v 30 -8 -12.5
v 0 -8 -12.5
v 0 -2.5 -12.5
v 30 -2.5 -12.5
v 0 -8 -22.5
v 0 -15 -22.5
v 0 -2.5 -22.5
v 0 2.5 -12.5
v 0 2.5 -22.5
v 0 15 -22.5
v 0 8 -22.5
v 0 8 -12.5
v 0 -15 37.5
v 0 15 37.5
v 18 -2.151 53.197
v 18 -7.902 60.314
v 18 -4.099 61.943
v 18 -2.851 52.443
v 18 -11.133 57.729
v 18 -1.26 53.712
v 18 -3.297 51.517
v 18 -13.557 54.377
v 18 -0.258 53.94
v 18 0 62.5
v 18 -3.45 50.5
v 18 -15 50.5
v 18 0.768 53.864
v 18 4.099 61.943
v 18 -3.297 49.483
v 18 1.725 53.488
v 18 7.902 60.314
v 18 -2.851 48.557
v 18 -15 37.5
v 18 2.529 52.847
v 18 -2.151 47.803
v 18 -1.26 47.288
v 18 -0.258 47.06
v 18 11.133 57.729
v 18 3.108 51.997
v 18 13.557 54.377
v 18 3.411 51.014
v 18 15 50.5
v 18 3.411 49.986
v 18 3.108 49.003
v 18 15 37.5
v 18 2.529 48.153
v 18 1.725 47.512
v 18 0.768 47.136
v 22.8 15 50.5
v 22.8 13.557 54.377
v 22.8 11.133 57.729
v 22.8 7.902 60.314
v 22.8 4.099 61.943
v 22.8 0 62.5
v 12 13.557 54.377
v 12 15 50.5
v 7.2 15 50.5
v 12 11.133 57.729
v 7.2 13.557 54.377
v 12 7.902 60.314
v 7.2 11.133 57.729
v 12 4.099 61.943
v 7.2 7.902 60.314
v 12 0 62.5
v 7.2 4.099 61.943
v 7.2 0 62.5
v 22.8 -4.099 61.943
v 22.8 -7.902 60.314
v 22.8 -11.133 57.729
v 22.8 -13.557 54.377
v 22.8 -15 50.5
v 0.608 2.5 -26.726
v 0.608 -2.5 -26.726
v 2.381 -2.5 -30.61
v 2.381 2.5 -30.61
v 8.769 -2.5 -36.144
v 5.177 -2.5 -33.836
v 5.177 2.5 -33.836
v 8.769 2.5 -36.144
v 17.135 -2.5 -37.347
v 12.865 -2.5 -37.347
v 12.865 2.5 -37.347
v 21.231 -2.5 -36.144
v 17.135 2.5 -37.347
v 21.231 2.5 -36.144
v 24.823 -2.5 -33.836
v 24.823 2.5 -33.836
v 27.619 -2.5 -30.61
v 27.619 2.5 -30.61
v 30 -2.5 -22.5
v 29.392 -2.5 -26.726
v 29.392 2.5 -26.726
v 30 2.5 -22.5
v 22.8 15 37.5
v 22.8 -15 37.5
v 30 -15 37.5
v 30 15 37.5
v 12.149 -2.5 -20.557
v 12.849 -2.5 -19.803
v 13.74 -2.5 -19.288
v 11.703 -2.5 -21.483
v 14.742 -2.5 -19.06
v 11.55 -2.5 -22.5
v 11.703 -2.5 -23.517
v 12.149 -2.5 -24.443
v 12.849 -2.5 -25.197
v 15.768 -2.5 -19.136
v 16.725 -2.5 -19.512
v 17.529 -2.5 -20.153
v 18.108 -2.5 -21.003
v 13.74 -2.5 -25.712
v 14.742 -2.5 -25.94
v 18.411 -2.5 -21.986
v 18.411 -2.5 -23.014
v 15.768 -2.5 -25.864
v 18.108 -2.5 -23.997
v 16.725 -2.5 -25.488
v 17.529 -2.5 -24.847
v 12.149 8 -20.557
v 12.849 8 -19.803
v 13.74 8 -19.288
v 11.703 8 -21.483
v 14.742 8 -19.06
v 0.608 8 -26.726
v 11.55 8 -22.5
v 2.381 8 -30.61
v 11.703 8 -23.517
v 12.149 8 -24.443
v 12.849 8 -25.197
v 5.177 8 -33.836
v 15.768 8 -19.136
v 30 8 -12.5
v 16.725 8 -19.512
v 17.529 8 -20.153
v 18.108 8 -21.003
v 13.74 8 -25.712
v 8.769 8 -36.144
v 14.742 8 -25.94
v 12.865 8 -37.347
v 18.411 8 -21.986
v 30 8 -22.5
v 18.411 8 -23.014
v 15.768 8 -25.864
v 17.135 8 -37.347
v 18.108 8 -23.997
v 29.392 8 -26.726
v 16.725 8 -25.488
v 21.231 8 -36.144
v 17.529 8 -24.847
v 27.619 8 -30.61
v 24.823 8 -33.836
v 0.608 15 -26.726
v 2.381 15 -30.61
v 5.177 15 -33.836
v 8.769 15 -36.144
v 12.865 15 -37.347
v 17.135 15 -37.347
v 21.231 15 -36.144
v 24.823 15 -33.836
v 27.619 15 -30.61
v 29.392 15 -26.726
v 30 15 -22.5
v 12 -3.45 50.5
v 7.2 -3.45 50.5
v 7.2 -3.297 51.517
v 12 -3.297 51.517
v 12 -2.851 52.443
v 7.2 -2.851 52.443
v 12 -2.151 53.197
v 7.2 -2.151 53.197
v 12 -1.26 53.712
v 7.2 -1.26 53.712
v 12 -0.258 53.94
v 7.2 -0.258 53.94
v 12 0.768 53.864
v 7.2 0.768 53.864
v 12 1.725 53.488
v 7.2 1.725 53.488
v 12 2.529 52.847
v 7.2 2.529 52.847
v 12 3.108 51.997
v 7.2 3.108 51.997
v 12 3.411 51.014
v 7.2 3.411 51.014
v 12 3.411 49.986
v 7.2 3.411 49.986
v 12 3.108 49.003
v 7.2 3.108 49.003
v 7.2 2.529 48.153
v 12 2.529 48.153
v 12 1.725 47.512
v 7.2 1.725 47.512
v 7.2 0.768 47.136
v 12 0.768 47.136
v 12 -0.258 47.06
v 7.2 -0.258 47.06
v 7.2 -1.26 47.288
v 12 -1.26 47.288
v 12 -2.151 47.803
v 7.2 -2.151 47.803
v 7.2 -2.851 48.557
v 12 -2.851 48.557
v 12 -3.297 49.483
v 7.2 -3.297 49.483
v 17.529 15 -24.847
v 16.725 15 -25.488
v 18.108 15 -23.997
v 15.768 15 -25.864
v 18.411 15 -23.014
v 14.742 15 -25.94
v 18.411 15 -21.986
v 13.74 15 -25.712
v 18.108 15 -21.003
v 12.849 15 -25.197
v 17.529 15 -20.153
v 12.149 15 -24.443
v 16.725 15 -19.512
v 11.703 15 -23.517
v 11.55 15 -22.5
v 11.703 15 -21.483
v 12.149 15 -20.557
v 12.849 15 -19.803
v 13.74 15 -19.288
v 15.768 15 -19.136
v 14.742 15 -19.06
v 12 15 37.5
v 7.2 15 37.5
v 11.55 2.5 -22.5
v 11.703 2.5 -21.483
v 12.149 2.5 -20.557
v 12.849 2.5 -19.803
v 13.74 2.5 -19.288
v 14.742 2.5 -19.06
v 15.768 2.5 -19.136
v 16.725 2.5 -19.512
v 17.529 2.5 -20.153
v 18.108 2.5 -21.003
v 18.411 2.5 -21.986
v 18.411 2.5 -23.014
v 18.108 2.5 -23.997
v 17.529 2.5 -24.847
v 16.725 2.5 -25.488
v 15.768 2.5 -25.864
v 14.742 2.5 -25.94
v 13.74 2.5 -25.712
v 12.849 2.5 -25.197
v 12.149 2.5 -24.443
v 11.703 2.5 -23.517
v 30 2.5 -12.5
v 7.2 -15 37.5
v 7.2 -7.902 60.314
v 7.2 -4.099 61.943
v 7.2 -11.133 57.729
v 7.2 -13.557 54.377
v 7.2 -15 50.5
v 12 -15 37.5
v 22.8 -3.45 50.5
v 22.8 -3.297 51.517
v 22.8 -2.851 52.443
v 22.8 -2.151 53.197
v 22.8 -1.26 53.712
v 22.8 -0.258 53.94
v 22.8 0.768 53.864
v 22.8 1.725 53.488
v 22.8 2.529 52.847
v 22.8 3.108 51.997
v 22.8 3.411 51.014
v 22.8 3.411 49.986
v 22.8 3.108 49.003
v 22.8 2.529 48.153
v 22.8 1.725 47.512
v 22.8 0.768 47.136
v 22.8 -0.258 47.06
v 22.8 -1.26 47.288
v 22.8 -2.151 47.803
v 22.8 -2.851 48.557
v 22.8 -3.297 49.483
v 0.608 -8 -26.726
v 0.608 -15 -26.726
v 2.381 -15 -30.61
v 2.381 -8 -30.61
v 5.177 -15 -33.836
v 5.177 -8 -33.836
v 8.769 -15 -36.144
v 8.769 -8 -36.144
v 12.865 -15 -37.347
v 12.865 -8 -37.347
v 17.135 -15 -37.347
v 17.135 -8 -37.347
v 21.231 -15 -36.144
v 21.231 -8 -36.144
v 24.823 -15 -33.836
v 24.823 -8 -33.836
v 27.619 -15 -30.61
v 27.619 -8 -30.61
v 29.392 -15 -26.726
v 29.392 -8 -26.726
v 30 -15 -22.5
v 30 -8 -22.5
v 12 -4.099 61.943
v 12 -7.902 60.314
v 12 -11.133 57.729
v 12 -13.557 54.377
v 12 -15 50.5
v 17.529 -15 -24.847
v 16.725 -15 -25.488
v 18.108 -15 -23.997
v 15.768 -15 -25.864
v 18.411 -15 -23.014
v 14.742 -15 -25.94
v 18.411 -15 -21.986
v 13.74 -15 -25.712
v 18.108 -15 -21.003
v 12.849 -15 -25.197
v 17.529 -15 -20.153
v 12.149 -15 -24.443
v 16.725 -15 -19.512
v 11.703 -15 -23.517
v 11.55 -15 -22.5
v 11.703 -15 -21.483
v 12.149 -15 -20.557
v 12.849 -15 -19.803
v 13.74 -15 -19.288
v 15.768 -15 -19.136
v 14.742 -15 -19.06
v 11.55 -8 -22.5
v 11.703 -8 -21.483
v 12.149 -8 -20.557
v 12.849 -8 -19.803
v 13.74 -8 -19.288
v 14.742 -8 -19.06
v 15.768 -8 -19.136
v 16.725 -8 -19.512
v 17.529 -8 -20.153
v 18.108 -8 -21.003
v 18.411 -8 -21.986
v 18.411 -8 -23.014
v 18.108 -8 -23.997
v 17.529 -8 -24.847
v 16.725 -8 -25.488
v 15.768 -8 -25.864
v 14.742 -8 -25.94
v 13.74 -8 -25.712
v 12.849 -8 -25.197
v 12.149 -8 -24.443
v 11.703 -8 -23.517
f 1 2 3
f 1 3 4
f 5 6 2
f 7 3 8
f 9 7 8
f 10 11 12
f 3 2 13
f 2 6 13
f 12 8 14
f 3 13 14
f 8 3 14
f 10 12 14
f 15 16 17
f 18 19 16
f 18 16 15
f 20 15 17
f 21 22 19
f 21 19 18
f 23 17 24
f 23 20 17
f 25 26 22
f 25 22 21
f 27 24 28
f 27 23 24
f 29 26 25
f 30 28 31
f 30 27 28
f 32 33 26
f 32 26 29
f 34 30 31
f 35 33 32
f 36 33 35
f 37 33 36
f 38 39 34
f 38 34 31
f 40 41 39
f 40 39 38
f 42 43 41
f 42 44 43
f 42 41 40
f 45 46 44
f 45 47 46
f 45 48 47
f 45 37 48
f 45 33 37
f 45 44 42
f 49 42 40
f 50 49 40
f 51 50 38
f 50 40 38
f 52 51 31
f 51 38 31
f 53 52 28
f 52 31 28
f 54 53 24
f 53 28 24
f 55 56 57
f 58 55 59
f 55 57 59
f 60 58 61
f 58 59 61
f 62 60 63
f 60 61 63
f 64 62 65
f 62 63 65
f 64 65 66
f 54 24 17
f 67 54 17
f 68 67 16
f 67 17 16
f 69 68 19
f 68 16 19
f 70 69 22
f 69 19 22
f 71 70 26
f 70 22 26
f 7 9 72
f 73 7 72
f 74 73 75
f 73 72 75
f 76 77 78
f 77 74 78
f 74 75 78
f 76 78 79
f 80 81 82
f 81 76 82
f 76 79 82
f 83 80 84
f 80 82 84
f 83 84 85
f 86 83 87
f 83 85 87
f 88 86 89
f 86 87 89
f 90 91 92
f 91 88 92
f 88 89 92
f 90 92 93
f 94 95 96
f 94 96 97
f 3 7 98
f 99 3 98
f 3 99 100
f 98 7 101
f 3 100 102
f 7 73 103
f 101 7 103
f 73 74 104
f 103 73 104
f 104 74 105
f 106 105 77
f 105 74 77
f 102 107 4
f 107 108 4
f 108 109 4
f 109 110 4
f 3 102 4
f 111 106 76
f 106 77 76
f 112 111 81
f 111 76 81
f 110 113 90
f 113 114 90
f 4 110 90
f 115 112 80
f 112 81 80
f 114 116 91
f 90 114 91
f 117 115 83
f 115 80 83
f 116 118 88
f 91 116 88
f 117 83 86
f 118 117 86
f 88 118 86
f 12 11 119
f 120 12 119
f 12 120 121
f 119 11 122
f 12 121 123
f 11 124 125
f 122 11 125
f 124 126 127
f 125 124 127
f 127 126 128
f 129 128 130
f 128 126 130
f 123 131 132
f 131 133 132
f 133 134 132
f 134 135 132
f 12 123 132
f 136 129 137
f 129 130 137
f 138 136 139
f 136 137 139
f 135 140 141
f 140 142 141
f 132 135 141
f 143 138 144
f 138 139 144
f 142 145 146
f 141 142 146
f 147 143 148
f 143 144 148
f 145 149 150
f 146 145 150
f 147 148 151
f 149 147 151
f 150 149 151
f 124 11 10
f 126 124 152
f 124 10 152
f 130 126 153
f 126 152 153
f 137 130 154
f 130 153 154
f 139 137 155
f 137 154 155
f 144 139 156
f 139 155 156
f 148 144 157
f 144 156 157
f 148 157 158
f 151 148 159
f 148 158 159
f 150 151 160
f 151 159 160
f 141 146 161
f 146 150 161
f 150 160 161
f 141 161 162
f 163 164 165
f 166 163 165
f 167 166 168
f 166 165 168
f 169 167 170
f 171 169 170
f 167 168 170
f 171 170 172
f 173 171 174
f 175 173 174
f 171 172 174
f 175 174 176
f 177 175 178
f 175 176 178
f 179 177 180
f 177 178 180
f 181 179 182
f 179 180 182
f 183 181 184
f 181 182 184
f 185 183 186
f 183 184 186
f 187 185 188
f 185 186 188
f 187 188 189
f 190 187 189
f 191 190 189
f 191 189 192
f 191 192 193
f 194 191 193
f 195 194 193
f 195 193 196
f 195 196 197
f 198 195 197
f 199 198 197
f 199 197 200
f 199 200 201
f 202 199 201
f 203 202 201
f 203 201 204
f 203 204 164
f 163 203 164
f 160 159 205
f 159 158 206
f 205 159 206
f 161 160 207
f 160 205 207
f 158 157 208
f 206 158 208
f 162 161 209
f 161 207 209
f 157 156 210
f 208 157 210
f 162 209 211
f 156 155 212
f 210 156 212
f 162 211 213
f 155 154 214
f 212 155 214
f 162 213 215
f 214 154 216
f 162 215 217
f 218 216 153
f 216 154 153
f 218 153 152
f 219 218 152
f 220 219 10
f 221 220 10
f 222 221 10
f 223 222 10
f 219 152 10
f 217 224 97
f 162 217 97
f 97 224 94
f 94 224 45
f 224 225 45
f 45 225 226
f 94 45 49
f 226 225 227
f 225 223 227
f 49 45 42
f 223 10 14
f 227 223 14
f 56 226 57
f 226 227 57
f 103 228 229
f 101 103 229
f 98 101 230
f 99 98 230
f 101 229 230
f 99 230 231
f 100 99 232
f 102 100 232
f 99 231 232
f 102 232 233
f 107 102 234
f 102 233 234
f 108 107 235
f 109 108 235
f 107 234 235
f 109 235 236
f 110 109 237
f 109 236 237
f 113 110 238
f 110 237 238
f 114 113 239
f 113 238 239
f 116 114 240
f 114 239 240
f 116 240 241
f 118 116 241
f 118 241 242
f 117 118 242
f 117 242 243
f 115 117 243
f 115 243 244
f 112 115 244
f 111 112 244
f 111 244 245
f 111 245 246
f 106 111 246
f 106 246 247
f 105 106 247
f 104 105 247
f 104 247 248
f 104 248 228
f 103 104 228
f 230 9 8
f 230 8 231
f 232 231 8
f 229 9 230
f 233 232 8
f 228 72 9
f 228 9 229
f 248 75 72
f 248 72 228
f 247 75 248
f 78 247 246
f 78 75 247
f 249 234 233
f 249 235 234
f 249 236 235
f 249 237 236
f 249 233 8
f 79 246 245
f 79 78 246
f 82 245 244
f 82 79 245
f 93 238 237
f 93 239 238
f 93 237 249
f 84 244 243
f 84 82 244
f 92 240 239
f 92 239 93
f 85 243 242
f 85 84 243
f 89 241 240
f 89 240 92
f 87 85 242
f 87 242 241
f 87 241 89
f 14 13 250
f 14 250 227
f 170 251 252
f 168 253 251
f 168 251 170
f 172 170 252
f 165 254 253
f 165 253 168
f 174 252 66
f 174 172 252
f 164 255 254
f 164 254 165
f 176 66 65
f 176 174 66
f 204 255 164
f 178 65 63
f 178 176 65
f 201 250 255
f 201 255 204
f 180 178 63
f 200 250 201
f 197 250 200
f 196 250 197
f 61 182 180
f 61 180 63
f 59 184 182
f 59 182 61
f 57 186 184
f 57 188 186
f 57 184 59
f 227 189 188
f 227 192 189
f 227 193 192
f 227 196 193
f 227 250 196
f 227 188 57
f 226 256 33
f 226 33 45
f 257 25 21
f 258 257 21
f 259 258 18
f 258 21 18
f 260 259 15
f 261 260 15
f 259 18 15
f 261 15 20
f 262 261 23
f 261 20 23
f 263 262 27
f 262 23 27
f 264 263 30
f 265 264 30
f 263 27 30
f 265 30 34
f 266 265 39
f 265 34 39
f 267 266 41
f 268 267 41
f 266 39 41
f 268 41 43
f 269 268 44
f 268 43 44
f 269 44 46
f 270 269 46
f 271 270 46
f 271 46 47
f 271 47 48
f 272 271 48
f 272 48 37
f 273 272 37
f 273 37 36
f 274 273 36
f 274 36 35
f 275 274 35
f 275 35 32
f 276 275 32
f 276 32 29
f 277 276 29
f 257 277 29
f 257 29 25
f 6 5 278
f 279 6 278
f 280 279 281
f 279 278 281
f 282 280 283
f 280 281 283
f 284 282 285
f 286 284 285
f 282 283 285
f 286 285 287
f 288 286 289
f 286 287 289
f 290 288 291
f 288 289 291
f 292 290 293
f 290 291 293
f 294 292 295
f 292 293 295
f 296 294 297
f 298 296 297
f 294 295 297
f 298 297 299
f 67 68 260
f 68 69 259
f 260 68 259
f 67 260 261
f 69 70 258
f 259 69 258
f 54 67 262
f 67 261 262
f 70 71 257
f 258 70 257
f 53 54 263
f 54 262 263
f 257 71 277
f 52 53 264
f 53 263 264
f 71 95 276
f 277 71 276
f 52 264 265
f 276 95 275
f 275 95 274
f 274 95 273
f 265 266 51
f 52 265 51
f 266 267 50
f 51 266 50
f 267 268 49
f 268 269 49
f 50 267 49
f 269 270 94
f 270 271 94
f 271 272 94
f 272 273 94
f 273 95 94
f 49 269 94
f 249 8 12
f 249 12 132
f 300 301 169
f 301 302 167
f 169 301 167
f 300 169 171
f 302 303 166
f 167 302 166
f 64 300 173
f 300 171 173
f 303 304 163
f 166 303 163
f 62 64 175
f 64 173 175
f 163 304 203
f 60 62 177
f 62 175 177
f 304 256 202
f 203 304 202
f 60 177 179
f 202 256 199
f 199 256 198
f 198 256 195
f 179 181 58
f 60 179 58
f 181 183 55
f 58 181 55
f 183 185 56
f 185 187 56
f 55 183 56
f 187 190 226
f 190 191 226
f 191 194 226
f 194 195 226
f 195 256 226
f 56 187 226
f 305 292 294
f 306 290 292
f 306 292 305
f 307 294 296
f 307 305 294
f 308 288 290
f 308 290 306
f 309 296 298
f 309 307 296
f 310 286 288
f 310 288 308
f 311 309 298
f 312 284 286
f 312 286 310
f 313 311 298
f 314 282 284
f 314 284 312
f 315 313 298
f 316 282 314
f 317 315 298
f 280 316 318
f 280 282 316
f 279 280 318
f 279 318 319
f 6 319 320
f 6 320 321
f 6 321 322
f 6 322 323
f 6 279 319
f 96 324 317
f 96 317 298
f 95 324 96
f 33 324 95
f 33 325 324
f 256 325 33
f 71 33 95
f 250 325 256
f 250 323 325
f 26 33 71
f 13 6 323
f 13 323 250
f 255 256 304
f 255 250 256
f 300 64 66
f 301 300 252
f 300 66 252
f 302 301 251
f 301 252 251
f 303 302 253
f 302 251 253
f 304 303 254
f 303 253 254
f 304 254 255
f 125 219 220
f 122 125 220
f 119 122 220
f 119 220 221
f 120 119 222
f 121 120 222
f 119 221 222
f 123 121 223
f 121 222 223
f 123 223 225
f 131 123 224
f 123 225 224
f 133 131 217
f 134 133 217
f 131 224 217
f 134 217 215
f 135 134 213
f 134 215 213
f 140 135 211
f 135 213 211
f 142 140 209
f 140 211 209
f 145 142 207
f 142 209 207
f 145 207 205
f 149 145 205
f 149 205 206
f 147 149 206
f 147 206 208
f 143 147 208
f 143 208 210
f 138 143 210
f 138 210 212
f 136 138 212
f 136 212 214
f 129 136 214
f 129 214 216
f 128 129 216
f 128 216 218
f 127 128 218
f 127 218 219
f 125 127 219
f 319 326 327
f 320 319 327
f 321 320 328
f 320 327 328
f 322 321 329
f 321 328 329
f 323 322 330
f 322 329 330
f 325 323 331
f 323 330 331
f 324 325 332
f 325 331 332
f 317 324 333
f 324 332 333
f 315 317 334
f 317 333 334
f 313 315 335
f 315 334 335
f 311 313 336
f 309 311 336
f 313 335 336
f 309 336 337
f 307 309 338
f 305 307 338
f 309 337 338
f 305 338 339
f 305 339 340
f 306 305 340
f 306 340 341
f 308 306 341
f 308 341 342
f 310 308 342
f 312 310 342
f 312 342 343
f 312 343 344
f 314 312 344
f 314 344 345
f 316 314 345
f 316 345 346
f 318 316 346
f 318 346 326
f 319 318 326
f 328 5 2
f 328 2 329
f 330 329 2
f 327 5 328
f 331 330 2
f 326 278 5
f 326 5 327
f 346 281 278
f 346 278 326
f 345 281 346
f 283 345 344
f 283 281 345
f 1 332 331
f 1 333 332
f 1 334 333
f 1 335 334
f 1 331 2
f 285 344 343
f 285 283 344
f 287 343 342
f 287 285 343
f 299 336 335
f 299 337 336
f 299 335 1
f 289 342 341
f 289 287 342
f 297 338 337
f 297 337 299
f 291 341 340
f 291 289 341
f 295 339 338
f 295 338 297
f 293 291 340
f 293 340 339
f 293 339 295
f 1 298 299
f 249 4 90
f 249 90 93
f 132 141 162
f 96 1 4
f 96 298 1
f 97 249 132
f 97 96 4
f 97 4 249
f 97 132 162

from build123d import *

# Parameters (mm, degrees)
F0_W      = 30
F0_H      = 75
F1_DEPTH  = 30
F4_DEPTH  = 30.001
F2_W      = 30
F2_H      = 5.5
F5_DEPTH  = 25
F3_R      = 3.45
F6_DEPTH  = 30.001
F7_W      = 4.8
F7_H      = 30
F8_DEPTH  = 25
F10_DEPTH = 22.801
F9_R      = 3.45
F11_DEPTH = 22.801


with BuildPart() as f1:
    # F0 (on Right) → F1 (new body)
    with BuildSketch(Plane.YZ):
        Rectangle(F0_W, F0_H)
    extrude(amount=F1_DEPTH)

    # F3 (on face) → F4 (cut, through all)
    with BuildSketch(Plane(origin=(0, 15, 0), x_dir=(-1, 0, 0), z_dir=(0, 1, 0))):
        with BuildLine():
            ThreePointArc((-15, -37.5), (-25.6066017178, -33.1066017178), (-30, -22.5))
            Line((-30, -22.5), (-30, -37.5))
            Line((-30, -37.5), (-15, -37.5))
        make_face()
        with BuildLine():
            ThreePointArc((0, -22.5), (-4.3933982822, -33.1066017178), (-15, -37.5))
            Line((-15, -37.5), (0, -37.5))
            Line((0, -37.5), (0, -22.5))
        make_face()
    extrude(amount=-F4_DEPTH, mode=Mode.SUBTRACT)

    # F2 (on face) → F5 (cut)
    with BuildSketch(Plane(origin=(0, 0, -37.5), x_dir=(1, 0, 0), z_dir=(0, 0, -1))):
        with Locations((15, 5.25)):
            Rectangle(F2_W, F2_H)
        with Locations((15, -5.25)):
            Rectangle(F2_W, F2_H)
    extrude(amount=-F5_DEPTH, mode=Mode.SUBTRACT)

    # F3 (on face) → F6 (cut, through all)
    with BuildSketch(Plane(origin=(0, 15, 0), x_dir=(-1, 0, 0), z_dir=(0, 1, 0))):
        with Locations((-15, -22.5)):
            Circle(F3_R)
    extrude(amount=-F6_DEPTH, mode=Mode.SUBTRACT)

    # F7 (on face) → F8 (join)
    with BuildSketch(Plane.XY.offset(37.5)):
        with Locations((9.6, 0)):
            Rectangle(F7_W, F7_H)
        with Locations((20.4, 0)):
            Rectangle(F7_W, F7_H)
    extrude(amount=F8_DEPTH)

    # F9 (on face) → F10 (cut, through all)
    with BuildSketch(Plane(origin=(7.2, 0, 0), x_dir=(0, -1, 0), z_dir=(-1, 0, 0))):
        with BuildLine():
            ThreePointArc((-15, 50.5), (-9.6046863561, 59.1308579452), (0, 62.5))
            Line((0, 62.5), (-15, 62.5))
            Line((-15, 62.5), (-15, 50.5))
        make_face()
        with BuildLine():
            ThreePointArc((0, 62.5), (9.6046863561, 59.1308579452), (15, 50.5))
            Line((15, 50.5), (15, 62.5))
            Line((15, 62.5), (0, 62.5))
        make_face()
    extrude(amount=-F10_DEPTH, mode=Mode.SUBTRACT)

    # F9 (on face) → F11 (cut, through all)
    with BuildSketch(Plane(origin=(7.2, 0, 0), x_dir=(0, -1, 0), z_dir=(-1, 0, 0))):
        with Locations((0, 50.5)):
            Circle(F9_R)
    extrude(amount=-F11_DEPTH, mode=Mode.SUBTRACT)


solid = f1.part
